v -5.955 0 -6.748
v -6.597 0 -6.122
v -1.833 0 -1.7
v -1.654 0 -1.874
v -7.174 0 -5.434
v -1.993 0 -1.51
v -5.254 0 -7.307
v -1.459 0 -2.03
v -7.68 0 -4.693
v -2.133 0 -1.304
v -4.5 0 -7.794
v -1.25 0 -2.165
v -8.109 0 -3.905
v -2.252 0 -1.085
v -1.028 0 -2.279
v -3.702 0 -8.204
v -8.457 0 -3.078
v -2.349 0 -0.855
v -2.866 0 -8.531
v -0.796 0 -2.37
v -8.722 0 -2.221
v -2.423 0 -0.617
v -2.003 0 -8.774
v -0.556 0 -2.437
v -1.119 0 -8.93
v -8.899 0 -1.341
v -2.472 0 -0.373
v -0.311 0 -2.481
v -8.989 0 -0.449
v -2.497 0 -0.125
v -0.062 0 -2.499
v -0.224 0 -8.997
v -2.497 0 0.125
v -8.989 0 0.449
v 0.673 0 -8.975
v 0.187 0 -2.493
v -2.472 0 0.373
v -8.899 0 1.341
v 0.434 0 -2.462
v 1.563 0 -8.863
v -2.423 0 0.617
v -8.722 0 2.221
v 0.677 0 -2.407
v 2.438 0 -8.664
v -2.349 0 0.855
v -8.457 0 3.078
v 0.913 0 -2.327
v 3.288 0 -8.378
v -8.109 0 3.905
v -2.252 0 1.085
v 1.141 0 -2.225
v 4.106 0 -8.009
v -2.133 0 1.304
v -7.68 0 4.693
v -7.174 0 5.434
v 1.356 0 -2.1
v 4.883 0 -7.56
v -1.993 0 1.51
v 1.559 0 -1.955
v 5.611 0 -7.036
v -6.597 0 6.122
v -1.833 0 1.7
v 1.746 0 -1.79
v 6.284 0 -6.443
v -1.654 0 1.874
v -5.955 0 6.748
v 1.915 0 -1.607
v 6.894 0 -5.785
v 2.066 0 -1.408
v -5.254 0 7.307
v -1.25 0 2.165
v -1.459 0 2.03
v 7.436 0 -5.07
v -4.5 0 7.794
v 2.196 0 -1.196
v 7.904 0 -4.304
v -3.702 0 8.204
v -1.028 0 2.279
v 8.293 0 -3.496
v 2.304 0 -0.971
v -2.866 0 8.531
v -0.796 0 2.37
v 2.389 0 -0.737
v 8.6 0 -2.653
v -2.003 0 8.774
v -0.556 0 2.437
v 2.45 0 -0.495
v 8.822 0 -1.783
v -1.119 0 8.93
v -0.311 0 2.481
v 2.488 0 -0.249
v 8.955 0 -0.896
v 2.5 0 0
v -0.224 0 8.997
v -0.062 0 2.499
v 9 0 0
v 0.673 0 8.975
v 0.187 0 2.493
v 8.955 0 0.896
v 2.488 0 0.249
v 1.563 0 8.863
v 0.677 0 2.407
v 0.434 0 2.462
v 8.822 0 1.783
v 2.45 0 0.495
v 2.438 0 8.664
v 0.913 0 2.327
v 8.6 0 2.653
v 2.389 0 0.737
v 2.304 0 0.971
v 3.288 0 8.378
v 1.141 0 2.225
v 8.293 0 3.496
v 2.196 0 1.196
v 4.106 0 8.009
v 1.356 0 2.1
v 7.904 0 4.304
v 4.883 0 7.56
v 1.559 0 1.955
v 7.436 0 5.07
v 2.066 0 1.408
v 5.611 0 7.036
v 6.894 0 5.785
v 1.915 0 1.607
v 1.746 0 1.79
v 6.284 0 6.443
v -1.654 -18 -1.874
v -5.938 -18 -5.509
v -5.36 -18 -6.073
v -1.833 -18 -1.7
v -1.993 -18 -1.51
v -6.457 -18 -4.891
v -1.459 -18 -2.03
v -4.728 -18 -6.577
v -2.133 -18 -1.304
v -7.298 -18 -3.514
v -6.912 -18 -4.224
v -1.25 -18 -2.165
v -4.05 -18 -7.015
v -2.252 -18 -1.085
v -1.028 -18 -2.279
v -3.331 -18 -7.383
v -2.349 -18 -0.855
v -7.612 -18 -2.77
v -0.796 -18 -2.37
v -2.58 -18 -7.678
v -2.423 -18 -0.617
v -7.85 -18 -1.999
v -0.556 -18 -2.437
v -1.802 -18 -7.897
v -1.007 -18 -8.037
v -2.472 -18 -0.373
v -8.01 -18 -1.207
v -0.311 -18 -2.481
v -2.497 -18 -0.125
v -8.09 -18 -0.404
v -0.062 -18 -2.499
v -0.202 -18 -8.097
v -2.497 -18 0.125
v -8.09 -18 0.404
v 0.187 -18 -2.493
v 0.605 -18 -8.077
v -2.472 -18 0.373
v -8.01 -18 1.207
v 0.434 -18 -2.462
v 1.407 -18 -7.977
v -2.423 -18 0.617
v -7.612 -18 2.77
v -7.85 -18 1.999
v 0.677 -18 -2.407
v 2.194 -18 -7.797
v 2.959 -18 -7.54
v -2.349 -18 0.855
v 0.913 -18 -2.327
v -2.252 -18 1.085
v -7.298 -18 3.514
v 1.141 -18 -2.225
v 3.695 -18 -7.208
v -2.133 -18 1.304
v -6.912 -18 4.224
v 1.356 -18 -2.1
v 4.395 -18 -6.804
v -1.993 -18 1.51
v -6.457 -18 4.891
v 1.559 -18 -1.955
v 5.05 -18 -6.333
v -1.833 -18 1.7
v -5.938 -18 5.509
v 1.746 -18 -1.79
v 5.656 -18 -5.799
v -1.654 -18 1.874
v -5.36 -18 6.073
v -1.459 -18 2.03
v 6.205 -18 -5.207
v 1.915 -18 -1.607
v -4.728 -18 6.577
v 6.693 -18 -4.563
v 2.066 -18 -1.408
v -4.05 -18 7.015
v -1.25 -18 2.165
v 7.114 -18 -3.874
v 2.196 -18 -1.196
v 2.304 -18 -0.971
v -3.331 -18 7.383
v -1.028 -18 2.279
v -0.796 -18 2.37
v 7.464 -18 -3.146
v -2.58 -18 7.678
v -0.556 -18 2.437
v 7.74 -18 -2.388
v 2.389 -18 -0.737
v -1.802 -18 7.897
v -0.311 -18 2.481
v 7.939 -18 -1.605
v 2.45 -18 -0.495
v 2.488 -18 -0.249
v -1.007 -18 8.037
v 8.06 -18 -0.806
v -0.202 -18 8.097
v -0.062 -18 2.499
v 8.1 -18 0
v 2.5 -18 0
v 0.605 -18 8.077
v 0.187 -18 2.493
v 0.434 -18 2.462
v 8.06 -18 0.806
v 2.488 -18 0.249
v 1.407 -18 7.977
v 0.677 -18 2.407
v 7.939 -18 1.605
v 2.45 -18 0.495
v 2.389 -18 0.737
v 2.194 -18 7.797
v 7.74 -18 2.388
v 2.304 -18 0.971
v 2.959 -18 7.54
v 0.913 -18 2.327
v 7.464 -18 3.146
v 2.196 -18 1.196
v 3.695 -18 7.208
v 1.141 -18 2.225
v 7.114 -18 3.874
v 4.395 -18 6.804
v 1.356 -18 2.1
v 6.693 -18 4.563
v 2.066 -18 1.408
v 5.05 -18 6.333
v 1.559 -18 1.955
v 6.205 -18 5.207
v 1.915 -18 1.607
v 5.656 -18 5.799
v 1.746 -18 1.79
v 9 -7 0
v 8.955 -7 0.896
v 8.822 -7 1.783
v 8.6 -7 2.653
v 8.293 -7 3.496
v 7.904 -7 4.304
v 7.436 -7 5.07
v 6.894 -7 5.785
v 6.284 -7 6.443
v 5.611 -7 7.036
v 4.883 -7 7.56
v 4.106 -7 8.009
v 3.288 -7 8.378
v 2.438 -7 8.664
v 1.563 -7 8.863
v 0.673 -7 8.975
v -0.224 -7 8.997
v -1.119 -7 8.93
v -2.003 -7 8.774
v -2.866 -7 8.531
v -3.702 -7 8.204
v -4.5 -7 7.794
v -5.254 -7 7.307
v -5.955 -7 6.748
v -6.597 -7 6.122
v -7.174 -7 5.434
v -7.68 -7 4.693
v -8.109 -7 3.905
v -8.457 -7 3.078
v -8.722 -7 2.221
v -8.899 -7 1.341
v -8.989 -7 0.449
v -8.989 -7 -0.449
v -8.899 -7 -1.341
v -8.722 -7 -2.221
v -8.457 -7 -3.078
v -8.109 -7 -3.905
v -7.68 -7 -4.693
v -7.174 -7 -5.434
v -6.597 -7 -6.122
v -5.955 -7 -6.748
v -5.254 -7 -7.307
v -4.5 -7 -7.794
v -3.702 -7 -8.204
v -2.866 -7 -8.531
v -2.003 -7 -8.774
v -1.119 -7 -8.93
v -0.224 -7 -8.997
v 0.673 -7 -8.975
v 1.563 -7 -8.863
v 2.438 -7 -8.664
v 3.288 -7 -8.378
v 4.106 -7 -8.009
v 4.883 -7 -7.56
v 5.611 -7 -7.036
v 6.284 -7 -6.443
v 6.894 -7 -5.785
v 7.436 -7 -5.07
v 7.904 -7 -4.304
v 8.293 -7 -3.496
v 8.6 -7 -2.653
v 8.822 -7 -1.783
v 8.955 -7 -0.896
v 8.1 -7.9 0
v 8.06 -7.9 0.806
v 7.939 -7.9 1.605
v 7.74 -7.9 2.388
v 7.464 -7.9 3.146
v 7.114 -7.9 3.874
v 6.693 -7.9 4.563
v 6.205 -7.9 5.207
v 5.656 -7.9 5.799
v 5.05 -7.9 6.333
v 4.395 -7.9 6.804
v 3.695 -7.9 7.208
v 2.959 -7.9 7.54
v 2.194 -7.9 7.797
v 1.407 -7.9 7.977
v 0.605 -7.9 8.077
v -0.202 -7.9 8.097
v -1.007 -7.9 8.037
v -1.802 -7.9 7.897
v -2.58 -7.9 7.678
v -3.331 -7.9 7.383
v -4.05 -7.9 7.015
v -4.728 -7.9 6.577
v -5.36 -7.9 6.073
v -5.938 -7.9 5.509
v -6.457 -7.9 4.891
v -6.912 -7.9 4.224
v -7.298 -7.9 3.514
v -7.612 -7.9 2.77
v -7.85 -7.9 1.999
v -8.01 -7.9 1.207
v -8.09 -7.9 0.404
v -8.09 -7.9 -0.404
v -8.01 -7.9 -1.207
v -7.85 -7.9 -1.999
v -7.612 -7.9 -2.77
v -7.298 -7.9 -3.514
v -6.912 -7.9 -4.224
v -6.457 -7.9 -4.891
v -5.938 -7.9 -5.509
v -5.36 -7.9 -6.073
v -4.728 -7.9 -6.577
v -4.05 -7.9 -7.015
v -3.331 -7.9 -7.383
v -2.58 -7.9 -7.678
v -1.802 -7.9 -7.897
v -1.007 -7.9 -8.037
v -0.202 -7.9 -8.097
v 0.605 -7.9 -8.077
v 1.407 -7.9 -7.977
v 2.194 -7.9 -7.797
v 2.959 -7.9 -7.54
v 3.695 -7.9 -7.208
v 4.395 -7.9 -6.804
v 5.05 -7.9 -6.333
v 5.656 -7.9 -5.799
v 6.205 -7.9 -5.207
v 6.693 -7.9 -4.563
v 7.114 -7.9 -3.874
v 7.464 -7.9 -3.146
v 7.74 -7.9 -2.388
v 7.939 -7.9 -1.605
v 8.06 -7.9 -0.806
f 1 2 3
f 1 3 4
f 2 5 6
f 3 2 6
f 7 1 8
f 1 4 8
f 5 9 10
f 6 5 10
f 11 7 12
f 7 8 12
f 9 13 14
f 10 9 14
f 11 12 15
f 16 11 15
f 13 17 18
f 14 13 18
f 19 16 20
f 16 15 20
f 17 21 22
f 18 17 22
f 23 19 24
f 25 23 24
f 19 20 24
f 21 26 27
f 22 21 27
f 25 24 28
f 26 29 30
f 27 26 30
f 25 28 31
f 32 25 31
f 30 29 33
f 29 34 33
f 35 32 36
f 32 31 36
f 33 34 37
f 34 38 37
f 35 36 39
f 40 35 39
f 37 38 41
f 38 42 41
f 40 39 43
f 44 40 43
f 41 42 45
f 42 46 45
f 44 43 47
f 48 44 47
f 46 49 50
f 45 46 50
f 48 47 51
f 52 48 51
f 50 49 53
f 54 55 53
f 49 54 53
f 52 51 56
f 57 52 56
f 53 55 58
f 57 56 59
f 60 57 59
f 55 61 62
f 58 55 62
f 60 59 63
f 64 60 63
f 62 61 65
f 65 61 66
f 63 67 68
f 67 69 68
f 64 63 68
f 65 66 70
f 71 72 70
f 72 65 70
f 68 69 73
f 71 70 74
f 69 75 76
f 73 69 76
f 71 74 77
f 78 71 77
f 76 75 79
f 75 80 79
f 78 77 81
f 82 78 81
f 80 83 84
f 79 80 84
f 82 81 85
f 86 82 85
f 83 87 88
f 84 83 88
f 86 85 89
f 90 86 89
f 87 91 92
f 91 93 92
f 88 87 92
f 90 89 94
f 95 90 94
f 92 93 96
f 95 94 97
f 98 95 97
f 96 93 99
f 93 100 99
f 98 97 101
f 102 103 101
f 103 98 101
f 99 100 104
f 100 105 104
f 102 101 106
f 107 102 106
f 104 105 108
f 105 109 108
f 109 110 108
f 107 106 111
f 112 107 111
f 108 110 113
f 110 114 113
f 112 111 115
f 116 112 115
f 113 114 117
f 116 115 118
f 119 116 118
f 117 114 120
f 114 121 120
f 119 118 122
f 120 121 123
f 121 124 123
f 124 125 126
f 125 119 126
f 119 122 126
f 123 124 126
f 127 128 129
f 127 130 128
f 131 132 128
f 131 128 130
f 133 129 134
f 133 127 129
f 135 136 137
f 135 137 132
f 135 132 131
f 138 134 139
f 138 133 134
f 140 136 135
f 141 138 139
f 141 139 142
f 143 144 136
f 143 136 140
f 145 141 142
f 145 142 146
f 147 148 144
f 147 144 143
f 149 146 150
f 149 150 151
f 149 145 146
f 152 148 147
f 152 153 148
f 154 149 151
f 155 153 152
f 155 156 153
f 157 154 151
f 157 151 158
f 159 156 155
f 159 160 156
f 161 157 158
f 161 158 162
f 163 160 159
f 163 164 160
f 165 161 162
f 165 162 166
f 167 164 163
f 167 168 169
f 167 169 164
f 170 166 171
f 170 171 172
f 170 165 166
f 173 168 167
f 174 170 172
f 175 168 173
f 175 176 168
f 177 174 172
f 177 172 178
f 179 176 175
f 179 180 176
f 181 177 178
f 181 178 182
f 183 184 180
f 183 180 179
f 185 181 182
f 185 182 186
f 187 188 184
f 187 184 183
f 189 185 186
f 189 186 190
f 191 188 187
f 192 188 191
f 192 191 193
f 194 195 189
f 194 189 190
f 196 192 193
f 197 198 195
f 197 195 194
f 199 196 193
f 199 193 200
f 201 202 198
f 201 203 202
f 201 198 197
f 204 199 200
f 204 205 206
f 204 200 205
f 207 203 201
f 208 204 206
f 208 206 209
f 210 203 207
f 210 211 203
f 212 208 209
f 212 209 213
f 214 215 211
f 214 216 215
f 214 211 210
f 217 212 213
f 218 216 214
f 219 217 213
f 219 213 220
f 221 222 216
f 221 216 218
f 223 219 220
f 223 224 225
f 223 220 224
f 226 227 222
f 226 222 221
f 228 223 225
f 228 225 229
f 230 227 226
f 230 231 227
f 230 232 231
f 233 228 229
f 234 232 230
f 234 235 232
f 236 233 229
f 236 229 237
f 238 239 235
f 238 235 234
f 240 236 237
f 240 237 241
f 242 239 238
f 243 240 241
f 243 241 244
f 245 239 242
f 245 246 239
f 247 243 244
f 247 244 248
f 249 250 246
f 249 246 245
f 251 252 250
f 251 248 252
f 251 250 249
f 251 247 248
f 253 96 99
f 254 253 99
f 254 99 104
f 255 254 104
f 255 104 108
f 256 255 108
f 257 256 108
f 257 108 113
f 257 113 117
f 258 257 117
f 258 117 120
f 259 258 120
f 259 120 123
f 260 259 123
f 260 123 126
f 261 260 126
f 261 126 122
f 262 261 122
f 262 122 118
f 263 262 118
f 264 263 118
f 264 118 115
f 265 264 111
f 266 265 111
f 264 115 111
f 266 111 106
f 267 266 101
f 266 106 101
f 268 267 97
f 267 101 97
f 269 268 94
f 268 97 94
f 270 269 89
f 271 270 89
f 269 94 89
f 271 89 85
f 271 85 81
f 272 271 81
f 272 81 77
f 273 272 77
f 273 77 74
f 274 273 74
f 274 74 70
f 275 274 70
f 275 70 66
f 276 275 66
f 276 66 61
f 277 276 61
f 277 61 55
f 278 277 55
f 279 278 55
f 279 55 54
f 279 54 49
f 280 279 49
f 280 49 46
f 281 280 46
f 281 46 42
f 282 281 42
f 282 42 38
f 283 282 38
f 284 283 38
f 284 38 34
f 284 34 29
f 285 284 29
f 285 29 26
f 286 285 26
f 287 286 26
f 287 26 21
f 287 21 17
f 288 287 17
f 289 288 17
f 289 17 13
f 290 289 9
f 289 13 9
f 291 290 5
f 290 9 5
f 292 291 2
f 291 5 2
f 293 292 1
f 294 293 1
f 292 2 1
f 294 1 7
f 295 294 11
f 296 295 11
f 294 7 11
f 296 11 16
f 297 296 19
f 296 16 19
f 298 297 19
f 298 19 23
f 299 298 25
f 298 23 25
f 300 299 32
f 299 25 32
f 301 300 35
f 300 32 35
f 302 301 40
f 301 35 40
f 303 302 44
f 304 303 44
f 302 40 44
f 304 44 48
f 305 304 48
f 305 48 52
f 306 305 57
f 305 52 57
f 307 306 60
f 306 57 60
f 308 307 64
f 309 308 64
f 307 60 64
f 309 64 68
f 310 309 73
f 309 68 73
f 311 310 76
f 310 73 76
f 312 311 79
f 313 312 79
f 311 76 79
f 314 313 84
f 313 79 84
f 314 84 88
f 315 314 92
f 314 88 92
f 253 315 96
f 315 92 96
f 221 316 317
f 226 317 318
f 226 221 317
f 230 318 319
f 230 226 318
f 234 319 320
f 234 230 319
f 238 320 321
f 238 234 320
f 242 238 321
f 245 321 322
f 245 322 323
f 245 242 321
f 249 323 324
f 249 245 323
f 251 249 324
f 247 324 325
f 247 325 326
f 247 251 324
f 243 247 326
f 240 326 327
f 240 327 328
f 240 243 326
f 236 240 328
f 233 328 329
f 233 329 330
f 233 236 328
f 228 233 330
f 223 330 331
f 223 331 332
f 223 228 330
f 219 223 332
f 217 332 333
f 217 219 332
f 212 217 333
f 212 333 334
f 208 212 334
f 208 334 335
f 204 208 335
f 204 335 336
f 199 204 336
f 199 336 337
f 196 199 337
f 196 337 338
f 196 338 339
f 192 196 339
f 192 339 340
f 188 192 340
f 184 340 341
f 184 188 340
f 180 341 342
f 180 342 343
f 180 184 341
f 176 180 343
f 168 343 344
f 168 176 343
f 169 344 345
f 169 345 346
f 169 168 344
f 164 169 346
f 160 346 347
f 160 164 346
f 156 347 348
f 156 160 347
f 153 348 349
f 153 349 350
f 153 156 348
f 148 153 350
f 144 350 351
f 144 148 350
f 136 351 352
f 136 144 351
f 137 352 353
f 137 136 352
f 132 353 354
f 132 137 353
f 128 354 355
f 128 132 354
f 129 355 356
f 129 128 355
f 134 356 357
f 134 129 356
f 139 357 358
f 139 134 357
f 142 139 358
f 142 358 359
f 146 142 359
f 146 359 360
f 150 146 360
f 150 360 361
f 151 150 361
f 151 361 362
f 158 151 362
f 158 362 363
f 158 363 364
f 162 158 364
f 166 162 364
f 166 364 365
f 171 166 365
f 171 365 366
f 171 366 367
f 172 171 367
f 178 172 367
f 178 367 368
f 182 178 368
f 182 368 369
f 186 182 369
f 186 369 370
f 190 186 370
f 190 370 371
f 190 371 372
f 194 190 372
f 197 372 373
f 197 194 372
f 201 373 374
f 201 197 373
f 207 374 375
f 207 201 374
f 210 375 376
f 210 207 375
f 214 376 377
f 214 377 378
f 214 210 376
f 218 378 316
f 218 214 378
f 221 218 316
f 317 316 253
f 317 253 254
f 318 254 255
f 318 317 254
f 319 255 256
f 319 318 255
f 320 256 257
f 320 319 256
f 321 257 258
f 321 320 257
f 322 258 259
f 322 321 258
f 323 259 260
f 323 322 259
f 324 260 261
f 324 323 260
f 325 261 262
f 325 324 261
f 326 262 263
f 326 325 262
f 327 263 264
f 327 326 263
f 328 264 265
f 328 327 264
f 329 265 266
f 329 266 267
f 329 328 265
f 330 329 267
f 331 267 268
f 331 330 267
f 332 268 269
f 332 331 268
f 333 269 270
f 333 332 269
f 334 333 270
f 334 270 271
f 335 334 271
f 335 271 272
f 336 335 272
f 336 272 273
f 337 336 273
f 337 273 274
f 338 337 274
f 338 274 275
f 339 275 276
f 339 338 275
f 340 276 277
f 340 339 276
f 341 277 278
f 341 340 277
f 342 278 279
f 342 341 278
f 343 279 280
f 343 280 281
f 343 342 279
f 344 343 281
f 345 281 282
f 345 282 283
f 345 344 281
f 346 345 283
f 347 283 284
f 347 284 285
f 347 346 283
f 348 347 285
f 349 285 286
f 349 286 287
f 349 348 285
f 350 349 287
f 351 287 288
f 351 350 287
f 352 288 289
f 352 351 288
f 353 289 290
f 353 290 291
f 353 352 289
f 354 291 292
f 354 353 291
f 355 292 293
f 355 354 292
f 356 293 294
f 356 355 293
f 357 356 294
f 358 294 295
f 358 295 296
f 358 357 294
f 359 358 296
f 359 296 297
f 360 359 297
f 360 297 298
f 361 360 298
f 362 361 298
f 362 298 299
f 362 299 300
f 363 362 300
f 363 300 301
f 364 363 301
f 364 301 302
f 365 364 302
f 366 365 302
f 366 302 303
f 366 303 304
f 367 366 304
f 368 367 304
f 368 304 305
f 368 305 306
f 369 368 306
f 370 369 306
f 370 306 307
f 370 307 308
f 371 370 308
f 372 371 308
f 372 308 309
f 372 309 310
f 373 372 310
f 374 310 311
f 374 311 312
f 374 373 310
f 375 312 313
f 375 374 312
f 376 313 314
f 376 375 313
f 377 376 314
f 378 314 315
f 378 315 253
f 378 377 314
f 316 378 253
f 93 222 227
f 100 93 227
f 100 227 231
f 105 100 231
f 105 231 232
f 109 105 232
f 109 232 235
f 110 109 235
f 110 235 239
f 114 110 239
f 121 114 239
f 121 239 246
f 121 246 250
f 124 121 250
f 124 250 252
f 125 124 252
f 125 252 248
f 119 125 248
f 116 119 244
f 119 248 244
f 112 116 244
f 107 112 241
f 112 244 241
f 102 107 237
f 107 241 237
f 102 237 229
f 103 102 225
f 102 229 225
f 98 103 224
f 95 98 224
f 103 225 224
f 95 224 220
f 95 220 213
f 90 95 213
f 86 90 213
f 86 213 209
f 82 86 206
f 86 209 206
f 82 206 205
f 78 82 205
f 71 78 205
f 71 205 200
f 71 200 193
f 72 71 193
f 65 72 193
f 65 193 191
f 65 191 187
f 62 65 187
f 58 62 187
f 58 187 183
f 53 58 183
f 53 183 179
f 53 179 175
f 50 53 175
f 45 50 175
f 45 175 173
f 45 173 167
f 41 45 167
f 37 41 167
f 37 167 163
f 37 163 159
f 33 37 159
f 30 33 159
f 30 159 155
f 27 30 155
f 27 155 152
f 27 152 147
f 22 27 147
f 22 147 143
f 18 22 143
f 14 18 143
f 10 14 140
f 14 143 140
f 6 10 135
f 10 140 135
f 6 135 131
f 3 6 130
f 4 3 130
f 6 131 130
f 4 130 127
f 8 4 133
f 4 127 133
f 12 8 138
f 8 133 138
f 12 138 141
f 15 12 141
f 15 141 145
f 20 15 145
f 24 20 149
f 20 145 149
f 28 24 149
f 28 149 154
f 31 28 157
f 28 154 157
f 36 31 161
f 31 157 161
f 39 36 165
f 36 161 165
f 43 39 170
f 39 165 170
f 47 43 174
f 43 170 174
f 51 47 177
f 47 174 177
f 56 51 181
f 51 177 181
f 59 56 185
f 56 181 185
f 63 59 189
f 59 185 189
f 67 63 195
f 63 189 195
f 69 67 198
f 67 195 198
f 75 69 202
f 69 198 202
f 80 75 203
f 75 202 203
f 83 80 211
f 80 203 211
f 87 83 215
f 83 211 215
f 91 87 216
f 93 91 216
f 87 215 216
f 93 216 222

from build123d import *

# Parameters (mm, degrees)
F0_R        = 9
F1_DEPTH    = 8
F2_R        = 8.1
F3_DEPTH    = 10
F4_S5_R     = 8.1
F4_T6_DEPTH = 14
F5_R        = 2.5
F6_DEPTH    = 18.001


# Not quite as in the source:
# - a fillet or chamfer that OpenCascade refuses, or shapes differently, is made with other operations: its cross-section is extruded or revolved along the edge and cut away or added


with BuildPart() as f1:
    # F0 (on Front) → F1 (new body)
    with BuildSketch(Plane.XZ):
        Circle(F0_R)
    extrude(amount=F1_DEPTH)

    # F2 (on face) → F3 (join)
    with BuildSketch(Plane.XZ.offset(8)):
        Circle(F2_R)
    extrude(amount=F3_DEPTH)

    # F4: chamfer of 1 on 1 edges, made by hand


with BuildPart() as f4_tool2:
    # F4_s3 → F4_t4 (revolve)
    with BuildSketch(Plane.XY):
        Polygon((9, -7), (8, -8), (9, -8), align=None)
    revolve(axis=Axis((0, -8, 0), (0, -1, 0)))

    # F4_s5 → F4_t6 (cut, symmetric)
    with BuildSketch(Plane.XZ.offset(7.5)):
        Circle(F4_S5_R)
    extrude(amount=F4_T6_DEPTH, both=True, mode=Mode.SUBTRACT)


with BuildPart() as f1_1:
    add(f1.part)

    # F4_t1: cut F4_tool2
    add(f4_tool2.part, mode=Mode.SUBTRACT)

    # F5 (on face) → F6 (cut, through all)
    with BuildSketch(Plane.XZ.offset(18)):
        Circle(F5_R)
    extrude(amount=-F6_DEPTH, mode=Mode.SUBTRACT)


solid = f1_1.part
